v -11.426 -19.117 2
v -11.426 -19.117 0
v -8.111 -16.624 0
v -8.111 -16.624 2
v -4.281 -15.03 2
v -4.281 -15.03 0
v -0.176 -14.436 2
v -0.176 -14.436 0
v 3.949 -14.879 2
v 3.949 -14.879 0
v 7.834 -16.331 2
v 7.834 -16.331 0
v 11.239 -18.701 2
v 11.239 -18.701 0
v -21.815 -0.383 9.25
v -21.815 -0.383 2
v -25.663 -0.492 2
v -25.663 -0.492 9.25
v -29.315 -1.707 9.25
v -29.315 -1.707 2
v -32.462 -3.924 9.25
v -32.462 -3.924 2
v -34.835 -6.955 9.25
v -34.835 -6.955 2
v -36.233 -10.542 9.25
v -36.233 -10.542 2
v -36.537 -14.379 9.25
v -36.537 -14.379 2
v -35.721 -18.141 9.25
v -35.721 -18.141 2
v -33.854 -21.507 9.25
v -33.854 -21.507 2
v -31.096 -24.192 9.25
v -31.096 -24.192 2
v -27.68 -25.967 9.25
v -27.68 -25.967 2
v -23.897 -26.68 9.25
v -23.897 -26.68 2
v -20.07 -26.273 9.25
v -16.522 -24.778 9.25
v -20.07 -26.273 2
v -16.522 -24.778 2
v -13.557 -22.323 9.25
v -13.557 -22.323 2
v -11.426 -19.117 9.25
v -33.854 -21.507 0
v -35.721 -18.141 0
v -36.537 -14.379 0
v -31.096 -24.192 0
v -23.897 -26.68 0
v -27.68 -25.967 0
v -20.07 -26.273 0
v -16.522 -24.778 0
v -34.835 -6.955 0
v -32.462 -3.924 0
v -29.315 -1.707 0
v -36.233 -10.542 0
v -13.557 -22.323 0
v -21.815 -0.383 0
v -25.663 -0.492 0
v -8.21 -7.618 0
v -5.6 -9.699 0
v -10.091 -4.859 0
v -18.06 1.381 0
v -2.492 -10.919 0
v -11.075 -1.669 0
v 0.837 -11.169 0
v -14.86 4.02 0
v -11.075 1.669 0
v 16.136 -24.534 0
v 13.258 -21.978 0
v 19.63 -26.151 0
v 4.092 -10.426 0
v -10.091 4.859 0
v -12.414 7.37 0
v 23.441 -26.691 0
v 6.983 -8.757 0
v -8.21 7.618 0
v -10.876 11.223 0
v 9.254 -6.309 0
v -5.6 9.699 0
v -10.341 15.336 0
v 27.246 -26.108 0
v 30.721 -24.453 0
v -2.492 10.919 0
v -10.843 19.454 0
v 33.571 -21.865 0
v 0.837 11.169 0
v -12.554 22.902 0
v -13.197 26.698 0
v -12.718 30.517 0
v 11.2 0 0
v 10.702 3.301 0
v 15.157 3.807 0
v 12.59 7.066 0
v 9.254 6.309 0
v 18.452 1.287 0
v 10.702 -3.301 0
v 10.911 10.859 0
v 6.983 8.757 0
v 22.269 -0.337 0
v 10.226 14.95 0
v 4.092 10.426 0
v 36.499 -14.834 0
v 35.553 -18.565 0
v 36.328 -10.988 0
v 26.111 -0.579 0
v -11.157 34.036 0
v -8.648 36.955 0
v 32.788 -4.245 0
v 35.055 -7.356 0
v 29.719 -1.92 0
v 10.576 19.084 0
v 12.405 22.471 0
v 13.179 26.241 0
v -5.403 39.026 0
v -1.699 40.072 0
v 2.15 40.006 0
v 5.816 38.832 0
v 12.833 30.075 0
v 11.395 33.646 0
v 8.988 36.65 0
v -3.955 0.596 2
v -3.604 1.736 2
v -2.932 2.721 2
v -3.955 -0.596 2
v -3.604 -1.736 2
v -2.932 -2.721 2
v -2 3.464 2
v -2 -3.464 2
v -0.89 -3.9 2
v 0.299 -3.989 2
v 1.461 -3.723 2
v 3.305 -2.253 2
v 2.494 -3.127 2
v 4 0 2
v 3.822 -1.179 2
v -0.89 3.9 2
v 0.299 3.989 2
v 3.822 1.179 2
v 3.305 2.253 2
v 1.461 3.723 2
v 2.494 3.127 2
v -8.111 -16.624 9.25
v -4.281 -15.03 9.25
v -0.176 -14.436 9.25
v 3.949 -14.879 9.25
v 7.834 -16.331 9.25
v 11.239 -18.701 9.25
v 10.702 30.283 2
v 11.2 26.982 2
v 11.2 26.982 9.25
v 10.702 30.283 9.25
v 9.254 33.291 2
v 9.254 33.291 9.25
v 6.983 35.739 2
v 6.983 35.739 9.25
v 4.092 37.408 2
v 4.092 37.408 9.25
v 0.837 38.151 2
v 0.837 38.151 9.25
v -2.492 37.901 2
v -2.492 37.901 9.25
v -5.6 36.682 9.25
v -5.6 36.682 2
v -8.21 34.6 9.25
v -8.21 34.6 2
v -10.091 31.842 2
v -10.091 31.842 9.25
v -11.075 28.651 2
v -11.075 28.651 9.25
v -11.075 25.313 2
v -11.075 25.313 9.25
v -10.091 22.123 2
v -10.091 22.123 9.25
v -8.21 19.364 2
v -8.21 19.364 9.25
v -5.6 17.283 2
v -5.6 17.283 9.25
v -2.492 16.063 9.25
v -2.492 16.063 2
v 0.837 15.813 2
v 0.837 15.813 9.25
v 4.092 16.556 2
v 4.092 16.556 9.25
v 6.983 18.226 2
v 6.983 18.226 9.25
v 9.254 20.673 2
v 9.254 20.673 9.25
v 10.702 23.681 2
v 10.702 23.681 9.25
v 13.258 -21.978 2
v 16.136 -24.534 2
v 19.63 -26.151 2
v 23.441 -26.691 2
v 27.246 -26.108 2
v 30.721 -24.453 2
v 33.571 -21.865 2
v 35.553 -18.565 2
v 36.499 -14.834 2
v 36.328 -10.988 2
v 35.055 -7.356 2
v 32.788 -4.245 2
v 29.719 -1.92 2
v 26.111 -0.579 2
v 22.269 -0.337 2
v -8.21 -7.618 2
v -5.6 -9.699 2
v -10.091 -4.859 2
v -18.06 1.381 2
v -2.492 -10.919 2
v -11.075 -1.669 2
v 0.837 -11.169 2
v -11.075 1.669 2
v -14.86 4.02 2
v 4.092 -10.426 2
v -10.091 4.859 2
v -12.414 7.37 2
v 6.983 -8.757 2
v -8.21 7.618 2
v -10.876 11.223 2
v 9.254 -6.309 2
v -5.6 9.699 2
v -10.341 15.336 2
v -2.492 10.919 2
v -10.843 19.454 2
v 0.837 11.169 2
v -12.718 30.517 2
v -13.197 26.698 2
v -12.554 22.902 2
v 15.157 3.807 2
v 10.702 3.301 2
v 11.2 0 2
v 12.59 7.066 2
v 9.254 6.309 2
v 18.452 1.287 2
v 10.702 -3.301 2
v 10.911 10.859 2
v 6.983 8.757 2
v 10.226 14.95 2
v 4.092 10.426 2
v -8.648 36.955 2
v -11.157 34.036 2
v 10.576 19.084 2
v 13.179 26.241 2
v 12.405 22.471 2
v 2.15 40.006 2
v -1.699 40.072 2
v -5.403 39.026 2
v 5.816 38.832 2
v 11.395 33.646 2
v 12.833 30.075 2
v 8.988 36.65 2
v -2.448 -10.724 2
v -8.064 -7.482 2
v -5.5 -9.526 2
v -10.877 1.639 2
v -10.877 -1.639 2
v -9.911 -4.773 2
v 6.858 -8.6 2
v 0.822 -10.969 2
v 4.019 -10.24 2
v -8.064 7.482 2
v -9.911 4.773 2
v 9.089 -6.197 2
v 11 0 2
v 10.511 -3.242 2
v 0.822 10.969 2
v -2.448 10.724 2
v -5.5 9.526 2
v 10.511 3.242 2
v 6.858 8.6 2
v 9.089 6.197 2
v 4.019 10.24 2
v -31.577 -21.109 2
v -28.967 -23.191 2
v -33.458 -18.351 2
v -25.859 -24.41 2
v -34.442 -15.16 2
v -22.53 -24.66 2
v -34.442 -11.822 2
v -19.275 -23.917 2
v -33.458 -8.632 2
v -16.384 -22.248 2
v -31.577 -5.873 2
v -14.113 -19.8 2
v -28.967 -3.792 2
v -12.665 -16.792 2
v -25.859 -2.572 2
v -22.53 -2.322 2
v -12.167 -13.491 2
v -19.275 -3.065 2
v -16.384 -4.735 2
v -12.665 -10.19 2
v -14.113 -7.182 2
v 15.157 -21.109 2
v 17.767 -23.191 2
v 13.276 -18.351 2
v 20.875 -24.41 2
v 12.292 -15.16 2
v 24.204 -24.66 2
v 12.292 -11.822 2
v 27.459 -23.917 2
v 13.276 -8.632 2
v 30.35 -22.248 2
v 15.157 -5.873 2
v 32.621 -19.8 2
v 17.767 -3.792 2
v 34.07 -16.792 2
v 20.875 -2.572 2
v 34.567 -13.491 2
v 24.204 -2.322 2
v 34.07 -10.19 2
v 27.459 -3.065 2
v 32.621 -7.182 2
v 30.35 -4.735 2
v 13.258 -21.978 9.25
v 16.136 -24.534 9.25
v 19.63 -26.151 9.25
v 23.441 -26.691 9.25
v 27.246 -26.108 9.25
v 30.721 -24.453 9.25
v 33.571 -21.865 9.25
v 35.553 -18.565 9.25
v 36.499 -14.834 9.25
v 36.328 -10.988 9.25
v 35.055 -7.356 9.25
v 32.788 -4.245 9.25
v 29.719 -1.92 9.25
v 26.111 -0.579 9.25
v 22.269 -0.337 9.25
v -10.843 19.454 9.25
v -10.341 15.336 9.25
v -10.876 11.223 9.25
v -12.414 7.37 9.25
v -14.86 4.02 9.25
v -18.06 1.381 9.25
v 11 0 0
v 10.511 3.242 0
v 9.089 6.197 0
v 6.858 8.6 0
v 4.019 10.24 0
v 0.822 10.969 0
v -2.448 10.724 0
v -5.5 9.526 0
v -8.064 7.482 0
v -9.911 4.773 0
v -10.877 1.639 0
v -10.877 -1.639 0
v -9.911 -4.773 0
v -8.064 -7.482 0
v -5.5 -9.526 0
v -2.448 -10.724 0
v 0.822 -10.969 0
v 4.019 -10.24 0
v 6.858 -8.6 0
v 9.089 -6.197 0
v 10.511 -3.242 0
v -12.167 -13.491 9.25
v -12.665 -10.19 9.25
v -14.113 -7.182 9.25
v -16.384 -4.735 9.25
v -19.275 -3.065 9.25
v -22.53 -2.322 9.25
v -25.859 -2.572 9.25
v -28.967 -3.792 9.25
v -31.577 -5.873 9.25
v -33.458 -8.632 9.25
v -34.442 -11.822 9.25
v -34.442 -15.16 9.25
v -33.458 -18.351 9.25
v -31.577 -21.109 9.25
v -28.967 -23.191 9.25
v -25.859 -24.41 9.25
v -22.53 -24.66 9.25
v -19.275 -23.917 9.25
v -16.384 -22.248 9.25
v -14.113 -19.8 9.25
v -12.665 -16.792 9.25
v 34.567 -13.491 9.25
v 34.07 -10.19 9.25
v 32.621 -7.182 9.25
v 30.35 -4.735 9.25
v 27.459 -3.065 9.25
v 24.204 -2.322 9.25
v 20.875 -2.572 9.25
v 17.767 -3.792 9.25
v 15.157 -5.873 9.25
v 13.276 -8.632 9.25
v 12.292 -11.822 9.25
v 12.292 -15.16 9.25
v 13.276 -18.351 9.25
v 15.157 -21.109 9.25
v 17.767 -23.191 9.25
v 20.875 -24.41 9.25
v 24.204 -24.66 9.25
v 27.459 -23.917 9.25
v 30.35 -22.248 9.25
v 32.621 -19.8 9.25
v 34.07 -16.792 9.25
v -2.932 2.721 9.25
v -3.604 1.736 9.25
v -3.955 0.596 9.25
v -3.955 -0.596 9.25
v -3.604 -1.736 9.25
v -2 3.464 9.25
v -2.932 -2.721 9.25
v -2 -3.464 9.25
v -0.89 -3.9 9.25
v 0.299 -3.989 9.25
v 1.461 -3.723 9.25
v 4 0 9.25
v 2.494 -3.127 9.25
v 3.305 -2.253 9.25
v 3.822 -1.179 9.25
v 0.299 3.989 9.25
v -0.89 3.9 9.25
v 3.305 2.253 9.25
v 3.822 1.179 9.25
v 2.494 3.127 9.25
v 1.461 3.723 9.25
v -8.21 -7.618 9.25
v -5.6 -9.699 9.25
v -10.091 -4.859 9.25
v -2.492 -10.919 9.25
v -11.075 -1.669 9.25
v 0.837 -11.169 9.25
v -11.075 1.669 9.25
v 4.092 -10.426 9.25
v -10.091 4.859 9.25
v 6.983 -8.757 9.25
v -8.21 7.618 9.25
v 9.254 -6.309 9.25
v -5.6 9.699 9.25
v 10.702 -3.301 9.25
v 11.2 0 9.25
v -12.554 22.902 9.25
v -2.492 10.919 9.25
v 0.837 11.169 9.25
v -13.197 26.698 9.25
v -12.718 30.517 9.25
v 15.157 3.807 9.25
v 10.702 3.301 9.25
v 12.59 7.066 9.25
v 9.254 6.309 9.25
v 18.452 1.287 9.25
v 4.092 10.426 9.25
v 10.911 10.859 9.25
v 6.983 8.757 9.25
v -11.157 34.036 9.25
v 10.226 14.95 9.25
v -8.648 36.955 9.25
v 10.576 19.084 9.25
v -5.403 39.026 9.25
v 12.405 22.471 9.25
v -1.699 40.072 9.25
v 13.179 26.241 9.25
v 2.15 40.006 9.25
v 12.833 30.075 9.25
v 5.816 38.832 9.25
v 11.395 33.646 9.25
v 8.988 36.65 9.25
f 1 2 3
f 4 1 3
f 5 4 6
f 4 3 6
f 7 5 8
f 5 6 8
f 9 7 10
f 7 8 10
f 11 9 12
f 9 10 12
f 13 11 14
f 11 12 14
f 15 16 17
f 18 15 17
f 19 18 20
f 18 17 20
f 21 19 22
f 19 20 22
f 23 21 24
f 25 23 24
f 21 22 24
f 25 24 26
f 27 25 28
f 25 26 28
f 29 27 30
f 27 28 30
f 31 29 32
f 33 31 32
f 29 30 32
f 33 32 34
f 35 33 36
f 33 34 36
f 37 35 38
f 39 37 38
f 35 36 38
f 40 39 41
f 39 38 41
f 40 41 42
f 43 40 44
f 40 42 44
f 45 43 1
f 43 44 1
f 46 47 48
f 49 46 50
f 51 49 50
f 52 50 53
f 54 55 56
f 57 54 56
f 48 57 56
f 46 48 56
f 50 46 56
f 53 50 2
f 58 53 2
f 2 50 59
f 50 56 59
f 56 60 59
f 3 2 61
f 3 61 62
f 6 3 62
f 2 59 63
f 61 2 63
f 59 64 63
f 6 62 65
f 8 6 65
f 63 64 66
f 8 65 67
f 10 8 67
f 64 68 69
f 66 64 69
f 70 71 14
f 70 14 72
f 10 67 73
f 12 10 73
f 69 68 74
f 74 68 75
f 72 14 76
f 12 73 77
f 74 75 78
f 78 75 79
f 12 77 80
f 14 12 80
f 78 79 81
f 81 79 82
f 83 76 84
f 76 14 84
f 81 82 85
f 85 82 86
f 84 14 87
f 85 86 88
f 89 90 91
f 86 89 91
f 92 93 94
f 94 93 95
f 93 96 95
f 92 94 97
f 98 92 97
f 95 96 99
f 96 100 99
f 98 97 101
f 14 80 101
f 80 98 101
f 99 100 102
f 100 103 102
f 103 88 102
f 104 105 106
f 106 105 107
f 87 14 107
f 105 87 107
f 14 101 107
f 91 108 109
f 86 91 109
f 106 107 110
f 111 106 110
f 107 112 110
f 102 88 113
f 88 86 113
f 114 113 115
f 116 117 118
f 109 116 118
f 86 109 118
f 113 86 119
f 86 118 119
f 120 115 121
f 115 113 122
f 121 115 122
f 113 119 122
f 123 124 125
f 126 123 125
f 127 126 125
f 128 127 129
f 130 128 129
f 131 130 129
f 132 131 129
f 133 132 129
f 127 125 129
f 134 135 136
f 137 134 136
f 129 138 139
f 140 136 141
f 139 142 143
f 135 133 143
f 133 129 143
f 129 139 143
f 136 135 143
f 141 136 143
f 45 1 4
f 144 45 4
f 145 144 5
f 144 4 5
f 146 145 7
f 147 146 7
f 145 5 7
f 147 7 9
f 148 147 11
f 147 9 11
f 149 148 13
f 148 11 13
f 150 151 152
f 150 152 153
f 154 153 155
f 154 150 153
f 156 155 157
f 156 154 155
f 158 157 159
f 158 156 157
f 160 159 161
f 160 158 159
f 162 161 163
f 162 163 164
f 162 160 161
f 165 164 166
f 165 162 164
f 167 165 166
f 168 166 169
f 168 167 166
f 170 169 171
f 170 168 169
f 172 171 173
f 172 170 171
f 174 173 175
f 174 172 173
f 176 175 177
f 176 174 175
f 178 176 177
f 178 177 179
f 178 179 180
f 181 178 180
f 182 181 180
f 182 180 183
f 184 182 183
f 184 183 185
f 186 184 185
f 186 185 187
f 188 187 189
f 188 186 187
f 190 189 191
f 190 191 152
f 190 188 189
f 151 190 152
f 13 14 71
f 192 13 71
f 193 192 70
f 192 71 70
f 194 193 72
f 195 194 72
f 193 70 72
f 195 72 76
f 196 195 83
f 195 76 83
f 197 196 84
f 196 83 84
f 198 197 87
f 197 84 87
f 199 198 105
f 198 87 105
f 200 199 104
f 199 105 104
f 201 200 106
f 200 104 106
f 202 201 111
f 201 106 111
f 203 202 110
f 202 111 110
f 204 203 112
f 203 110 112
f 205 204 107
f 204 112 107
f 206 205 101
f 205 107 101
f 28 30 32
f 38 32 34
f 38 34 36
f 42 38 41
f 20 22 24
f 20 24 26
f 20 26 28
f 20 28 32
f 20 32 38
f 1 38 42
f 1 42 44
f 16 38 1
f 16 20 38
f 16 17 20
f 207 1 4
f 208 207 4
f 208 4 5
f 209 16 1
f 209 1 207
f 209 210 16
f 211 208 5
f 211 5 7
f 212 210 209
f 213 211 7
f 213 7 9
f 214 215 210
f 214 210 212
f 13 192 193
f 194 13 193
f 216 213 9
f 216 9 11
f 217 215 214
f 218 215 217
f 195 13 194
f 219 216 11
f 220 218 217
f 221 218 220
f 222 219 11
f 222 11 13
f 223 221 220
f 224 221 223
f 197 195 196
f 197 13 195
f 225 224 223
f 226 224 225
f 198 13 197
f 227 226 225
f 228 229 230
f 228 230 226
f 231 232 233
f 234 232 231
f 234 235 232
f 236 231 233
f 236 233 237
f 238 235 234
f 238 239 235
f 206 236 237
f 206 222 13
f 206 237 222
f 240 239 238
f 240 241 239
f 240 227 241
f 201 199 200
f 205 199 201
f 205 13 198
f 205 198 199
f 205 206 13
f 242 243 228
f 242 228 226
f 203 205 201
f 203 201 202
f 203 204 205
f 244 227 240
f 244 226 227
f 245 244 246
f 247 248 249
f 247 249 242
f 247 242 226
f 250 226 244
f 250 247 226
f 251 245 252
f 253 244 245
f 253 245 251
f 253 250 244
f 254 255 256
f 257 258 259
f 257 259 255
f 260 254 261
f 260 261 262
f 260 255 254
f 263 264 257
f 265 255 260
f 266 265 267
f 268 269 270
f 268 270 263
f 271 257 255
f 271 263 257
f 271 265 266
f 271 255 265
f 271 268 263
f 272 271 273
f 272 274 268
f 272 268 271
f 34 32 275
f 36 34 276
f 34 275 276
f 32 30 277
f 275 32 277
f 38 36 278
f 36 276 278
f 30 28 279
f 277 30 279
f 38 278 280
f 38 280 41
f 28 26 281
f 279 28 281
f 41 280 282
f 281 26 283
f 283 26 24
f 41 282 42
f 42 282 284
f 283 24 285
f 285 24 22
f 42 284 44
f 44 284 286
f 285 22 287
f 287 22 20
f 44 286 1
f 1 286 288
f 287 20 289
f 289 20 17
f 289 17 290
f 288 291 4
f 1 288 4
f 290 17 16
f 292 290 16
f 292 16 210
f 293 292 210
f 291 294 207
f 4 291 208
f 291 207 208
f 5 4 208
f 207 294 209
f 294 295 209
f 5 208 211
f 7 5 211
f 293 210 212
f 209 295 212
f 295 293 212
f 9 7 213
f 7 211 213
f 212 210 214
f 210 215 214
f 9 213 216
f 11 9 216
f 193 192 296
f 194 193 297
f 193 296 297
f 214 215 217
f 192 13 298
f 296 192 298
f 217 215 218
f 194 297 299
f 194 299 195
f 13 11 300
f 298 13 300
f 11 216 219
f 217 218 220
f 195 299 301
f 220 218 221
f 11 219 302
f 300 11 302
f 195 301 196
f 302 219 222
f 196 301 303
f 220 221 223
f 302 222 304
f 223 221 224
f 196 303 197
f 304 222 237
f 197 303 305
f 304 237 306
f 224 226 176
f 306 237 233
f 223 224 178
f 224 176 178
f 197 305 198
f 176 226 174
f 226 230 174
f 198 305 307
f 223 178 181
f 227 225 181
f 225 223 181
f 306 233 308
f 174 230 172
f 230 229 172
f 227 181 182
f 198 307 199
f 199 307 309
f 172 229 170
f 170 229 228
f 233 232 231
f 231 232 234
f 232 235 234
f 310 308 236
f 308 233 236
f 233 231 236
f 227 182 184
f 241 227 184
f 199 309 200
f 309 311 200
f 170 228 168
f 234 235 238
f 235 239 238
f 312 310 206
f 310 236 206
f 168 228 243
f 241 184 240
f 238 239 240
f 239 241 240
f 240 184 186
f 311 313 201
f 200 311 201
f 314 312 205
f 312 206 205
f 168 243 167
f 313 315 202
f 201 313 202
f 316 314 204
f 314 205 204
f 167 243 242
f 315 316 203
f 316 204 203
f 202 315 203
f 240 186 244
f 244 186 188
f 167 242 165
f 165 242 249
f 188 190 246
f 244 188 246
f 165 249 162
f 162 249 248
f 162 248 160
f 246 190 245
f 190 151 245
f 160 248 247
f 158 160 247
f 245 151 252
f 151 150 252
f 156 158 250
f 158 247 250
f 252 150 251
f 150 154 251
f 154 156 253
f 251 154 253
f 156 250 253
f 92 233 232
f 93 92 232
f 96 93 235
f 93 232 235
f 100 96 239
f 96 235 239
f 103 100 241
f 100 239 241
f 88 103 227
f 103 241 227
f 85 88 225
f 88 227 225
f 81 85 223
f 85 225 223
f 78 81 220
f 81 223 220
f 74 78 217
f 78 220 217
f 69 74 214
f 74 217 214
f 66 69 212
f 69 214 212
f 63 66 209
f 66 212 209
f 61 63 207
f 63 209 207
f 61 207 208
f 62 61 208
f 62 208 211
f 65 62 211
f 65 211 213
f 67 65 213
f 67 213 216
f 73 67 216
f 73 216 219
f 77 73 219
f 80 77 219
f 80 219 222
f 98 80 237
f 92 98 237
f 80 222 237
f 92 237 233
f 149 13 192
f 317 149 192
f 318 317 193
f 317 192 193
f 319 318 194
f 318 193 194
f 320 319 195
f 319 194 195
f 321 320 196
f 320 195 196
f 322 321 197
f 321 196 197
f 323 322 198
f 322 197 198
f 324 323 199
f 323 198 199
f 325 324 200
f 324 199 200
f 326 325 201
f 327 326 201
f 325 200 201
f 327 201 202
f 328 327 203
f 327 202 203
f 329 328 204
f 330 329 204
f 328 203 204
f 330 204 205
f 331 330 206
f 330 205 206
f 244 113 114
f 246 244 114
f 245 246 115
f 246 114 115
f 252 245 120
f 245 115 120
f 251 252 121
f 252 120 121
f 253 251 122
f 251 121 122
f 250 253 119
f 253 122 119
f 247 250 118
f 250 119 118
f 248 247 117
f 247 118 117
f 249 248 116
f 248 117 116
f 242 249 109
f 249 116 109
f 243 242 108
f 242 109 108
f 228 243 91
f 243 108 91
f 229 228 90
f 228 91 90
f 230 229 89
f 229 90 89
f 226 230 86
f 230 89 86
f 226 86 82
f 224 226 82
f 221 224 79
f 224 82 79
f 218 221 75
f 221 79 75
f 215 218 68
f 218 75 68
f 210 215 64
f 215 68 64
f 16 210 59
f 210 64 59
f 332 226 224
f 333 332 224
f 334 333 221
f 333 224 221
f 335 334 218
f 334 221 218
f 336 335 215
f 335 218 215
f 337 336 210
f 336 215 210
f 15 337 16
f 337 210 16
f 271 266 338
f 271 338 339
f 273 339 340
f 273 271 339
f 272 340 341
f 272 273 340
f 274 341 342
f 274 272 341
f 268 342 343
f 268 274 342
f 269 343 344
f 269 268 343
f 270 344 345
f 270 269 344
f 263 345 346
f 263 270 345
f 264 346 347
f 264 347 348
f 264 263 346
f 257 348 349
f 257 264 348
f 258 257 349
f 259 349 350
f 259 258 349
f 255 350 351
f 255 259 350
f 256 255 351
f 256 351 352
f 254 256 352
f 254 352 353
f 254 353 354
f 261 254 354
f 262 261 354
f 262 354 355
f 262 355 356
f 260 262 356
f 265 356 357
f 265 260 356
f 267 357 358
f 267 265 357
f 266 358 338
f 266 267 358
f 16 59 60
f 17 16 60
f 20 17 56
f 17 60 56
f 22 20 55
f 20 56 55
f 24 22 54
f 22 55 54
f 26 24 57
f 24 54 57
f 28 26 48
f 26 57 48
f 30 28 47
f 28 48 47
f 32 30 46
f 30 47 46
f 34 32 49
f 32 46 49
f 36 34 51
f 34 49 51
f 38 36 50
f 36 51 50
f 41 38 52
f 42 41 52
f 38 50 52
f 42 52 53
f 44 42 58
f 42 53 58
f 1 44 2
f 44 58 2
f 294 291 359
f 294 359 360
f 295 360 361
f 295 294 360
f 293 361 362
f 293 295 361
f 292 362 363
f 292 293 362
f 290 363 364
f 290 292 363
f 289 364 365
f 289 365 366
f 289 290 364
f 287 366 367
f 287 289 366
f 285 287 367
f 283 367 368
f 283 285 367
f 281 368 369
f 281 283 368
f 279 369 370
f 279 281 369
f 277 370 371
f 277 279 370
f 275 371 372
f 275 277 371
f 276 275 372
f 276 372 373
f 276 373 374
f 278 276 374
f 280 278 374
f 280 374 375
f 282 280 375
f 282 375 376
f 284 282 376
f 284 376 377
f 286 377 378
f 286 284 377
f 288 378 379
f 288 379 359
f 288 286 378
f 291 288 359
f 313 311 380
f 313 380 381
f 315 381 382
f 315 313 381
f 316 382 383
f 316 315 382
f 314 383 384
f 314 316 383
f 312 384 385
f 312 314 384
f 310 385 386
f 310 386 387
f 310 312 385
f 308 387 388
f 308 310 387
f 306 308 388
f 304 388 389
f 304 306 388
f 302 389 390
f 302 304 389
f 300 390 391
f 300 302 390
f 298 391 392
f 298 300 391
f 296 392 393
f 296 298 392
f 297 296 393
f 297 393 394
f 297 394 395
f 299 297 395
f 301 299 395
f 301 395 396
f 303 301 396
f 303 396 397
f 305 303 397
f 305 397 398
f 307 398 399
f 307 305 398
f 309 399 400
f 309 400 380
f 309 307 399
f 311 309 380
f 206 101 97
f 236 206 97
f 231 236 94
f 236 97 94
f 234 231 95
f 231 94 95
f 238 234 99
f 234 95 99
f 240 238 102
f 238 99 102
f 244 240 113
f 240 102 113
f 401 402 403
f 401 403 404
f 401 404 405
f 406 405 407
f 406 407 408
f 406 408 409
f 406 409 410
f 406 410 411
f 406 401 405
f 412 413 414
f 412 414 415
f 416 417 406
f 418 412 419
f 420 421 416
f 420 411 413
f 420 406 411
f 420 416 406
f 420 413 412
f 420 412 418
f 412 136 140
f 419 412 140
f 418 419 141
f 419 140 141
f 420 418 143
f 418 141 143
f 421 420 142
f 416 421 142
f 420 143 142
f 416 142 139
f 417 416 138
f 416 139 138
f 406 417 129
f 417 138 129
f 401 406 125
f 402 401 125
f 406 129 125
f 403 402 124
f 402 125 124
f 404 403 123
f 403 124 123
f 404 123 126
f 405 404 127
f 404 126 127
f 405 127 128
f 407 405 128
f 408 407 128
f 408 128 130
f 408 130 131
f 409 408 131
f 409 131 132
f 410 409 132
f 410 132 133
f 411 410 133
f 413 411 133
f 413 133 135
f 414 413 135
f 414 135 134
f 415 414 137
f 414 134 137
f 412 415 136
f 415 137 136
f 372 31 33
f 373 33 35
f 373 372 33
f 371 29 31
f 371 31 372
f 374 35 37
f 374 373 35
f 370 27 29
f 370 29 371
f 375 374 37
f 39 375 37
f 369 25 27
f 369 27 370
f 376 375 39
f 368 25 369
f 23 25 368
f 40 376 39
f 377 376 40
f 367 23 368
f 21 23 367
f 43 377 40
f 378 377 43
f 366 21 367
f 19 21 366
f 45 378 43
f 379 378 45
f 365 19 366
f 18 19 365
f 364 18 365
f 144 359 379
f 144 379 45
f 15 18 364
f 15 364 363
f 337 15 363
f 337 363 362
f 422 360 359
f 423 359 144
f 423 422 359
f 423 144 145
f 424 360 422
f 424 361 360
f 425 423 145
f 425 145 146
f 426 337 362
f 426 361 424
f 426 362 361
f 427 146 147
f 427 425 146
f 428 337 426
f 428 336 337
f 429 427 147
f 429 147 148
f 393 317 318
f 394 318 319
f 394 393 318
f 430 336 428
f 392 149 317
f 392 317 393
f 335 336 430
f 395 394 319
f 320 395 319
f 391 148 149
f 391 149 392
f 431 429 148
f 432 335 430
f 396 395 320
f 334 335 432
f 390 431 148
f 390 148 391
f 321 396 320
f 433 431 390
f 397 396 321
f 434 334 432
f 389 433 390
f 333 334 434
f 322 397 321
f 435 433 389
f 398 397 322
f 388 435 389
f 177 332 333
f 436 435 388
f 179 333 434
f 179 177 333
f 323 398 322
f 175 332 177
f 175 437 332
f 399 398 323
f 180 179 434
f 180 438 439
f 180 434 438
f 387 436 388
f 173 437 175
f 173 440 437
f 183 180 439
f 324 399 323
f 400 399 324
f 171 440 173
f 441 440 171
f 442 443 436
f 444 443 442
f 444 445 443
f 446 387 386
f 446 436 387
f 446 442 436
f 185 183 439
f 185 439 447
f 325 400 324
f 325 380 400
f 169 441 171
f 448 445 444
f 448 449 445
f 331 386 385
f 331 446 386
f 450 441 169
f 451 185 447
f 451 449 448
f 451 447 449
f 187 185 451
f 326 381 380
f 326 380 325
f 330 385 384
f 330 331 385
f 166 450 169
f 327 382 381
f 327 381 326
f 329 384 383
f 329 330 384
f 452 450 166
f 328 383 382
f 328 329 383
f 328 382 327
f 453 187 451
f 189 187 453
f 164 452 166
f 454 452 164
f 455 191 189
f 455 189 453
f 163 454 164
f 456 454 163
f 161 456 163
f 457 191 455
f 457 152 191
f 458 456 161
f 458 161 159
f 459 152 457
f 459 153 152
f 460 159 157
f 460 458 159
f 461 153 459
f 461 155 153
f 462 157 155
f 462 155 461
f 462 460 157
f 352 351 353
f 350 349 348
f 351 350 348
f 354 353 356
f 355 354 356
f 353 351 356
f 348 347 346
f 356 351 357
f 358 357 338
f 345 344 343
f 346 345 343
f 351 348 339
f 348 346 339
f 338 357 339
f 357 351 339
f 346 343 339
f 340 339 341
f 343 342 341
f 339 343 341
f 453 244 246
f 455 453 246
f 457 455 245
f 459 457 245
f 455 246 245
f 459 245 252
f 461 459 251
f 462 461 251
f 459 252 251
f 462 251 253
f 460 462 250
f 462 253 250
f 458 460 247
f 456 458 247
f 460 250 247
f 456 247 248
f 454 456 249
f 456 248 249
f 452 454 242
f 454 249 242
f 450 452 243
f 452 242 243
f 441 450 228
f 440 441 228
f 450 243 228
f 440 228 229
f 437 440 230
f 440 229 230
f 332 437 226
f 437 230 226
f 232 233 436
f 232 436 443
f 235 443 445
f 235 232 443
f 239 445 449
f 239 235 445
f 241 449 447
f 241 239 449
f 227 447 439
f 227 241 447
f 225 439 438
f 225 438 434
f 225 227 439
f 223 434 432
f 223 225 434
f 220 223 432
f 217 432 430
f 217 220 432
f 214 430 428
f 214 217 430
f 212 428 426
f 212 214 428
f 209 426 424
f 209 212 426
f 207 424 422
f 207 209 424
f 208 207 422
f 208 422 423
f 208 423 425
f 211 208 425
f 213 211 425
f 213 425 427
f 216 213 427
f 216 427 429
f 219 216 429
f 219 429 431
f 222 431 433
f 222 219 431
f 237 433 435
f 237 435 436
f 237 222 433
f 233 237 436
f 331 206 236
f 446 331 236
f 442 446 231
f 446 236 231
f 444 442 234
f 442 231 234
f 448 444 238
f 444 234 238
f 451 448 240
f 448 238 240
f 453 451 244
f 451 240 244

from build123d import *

# Parameters (mm, degrees)
F1_DEPTH = 2
F3_R     = 11.2
F3_R_2   = 11
F4_DEPTH = 2
F2_R     = 11.2
F5_DEPTH = 7.25
F2_R_2   = 4


with BuildPart() as f1:
    # F0 (on Top) → F1 (new body)
    with BuildSketch(Plane.XY):
        with BuildLine():
            ThreePointArc((22.2692580733, -0.3368276066), (12.5901028135, 7.0657954034), (10.5760702249, 19.0836382509))
            ThreePointArc((10.5760702249, 19.0836382509), (0.2283074176, 40.1801913209), (-10.8429277726, 19.4541570183))
            ThreePointArc((-10.8429277726, 19.4541570183), (-12.4142097241, 7.370451171), (-21.8149506344, -0.3826736385))
            ThreePointArc((-21.8149506344, -0.3826736385), (-34.9112201217, -19.8923756369), (-11.4263303007, -19.1173294116))
            ThreePointArc((-11.4263303007, -19.1173294116), (-0.1758930894, -14.4362465745), (11.2388804095, -18.7009646124))
            ThreePointArc((11.2388804095, -18.7009646124), (34.682912704, -20.287815684), (22.2692580733, -0.3368276066))
        make_face()
    extrude(amount=F1_DEPTH)

    # F3 (on face) + F1_face1 (on face) → F4 (cut)
    with BuildSketch(Plane.XY.offset(2)):
        Circle(F3_R)
        Circle(F3_R_2, mode=Mode.SUBTRACT)
    with BuildSketch(Plane(origin=(0, 0, 0), x_dir=(1, 0, 0), z_dir=(0, 0, -1))):
        with BuildLine():
            ThreePointArc((10.5760702249, -19.0836382509), (12.5901028135, -7.0657954034), (22.2692580733, 0.3368276066))
            ThreePointArc((22.2692580733, 0.3368276066), (34.682912704, 20.287815684), (11.2388804095, 18.7009646124))
            ThreePointArc((11.2388804095, 18.7009646124), (-0.1758930894, 14.4362465745), (-11.4263303007, 19.1173294116))
            ThreePointArc((-11.4263303007, 19.1173294116), (-34.9112201217, 19.8923756369), (-21.8149506344, 0.3826736385))
            ThreePointArc((-21.8149506344, 0.3826736385), (-12.4142097241, -7.370451171), (-10.8429277726, -19.4541570183))
            ThreePointArc((-10.8429277726, -19.4541570183), (0.2283074176, -40.1801913209), (10.5760702249, -19.0836382509))
        make_face()
    extrude(amount=-F4_DEPTH, dir=(0, 0, 1), mode=Mode.SUBTRACT)


with BuildPart() as f5:
    # F2 (on face) → F5 (new body)
    with BuildSketch(Plane.XY.offset(2)):
        with BuildLine():
            ThreePointArc((11.2388804095, -18.7009646124), (34.682912704, -20.287815684), (22.2692580733, -0.3368276066))
            ThreePointArc((22.2692580733, -0.3368276066), (12.5901028135, 7.0657954034), (10.5760702249, 19.0836382509))
            ThreePointArc((10.5760702249, 19.0836382509), (0.2283074176, 40.1801913209), (-10.8429277726, 19.4541570183))
            ThreePointArc((-10.8429277726, 19.4541570183), (-12.4142097241, 7.370451171), (-21.8149506344, -0.3826736385))
            ThreePointArc((-21.8149506344, -0.3826736385), (-34.9112201217, -19.8923756369), (-11.4263303007, -19.1173294116))
            ThreePointArc((-11.4263303007, -19.1173294116), (-0.1758930894, -14.4362465745), (11.2388804095, -18.7009646124))
        make_face()
        with Locations((-23.3672410952, -13.4910829365)):
            Circle(F2_R, mode=Mode.SUBTRACT)
        with Locations((23.3672410952, -13.4910829365)):
            Circle(F2_R, mode=Mode.SUBTRACT)
        Circle(F2_R, mode=Mode.SUBTRACT)
        with Locations((0, 26.9821658731)):
            Circle(F2_R, mode=Mode.SUBTRACT)
    extrude(amount=F5_DEPTH)


with BuildPart() as f5b:
    # F2 (on face) → F5, piece 2 (new body)
    with BuildSketch(Plane.XY.offset(2)):
        Circle(F2_R_2)
    extrude(amount=F5_DEPTH)


solid = Compound([f1.part, f5.part, f5b.part])
